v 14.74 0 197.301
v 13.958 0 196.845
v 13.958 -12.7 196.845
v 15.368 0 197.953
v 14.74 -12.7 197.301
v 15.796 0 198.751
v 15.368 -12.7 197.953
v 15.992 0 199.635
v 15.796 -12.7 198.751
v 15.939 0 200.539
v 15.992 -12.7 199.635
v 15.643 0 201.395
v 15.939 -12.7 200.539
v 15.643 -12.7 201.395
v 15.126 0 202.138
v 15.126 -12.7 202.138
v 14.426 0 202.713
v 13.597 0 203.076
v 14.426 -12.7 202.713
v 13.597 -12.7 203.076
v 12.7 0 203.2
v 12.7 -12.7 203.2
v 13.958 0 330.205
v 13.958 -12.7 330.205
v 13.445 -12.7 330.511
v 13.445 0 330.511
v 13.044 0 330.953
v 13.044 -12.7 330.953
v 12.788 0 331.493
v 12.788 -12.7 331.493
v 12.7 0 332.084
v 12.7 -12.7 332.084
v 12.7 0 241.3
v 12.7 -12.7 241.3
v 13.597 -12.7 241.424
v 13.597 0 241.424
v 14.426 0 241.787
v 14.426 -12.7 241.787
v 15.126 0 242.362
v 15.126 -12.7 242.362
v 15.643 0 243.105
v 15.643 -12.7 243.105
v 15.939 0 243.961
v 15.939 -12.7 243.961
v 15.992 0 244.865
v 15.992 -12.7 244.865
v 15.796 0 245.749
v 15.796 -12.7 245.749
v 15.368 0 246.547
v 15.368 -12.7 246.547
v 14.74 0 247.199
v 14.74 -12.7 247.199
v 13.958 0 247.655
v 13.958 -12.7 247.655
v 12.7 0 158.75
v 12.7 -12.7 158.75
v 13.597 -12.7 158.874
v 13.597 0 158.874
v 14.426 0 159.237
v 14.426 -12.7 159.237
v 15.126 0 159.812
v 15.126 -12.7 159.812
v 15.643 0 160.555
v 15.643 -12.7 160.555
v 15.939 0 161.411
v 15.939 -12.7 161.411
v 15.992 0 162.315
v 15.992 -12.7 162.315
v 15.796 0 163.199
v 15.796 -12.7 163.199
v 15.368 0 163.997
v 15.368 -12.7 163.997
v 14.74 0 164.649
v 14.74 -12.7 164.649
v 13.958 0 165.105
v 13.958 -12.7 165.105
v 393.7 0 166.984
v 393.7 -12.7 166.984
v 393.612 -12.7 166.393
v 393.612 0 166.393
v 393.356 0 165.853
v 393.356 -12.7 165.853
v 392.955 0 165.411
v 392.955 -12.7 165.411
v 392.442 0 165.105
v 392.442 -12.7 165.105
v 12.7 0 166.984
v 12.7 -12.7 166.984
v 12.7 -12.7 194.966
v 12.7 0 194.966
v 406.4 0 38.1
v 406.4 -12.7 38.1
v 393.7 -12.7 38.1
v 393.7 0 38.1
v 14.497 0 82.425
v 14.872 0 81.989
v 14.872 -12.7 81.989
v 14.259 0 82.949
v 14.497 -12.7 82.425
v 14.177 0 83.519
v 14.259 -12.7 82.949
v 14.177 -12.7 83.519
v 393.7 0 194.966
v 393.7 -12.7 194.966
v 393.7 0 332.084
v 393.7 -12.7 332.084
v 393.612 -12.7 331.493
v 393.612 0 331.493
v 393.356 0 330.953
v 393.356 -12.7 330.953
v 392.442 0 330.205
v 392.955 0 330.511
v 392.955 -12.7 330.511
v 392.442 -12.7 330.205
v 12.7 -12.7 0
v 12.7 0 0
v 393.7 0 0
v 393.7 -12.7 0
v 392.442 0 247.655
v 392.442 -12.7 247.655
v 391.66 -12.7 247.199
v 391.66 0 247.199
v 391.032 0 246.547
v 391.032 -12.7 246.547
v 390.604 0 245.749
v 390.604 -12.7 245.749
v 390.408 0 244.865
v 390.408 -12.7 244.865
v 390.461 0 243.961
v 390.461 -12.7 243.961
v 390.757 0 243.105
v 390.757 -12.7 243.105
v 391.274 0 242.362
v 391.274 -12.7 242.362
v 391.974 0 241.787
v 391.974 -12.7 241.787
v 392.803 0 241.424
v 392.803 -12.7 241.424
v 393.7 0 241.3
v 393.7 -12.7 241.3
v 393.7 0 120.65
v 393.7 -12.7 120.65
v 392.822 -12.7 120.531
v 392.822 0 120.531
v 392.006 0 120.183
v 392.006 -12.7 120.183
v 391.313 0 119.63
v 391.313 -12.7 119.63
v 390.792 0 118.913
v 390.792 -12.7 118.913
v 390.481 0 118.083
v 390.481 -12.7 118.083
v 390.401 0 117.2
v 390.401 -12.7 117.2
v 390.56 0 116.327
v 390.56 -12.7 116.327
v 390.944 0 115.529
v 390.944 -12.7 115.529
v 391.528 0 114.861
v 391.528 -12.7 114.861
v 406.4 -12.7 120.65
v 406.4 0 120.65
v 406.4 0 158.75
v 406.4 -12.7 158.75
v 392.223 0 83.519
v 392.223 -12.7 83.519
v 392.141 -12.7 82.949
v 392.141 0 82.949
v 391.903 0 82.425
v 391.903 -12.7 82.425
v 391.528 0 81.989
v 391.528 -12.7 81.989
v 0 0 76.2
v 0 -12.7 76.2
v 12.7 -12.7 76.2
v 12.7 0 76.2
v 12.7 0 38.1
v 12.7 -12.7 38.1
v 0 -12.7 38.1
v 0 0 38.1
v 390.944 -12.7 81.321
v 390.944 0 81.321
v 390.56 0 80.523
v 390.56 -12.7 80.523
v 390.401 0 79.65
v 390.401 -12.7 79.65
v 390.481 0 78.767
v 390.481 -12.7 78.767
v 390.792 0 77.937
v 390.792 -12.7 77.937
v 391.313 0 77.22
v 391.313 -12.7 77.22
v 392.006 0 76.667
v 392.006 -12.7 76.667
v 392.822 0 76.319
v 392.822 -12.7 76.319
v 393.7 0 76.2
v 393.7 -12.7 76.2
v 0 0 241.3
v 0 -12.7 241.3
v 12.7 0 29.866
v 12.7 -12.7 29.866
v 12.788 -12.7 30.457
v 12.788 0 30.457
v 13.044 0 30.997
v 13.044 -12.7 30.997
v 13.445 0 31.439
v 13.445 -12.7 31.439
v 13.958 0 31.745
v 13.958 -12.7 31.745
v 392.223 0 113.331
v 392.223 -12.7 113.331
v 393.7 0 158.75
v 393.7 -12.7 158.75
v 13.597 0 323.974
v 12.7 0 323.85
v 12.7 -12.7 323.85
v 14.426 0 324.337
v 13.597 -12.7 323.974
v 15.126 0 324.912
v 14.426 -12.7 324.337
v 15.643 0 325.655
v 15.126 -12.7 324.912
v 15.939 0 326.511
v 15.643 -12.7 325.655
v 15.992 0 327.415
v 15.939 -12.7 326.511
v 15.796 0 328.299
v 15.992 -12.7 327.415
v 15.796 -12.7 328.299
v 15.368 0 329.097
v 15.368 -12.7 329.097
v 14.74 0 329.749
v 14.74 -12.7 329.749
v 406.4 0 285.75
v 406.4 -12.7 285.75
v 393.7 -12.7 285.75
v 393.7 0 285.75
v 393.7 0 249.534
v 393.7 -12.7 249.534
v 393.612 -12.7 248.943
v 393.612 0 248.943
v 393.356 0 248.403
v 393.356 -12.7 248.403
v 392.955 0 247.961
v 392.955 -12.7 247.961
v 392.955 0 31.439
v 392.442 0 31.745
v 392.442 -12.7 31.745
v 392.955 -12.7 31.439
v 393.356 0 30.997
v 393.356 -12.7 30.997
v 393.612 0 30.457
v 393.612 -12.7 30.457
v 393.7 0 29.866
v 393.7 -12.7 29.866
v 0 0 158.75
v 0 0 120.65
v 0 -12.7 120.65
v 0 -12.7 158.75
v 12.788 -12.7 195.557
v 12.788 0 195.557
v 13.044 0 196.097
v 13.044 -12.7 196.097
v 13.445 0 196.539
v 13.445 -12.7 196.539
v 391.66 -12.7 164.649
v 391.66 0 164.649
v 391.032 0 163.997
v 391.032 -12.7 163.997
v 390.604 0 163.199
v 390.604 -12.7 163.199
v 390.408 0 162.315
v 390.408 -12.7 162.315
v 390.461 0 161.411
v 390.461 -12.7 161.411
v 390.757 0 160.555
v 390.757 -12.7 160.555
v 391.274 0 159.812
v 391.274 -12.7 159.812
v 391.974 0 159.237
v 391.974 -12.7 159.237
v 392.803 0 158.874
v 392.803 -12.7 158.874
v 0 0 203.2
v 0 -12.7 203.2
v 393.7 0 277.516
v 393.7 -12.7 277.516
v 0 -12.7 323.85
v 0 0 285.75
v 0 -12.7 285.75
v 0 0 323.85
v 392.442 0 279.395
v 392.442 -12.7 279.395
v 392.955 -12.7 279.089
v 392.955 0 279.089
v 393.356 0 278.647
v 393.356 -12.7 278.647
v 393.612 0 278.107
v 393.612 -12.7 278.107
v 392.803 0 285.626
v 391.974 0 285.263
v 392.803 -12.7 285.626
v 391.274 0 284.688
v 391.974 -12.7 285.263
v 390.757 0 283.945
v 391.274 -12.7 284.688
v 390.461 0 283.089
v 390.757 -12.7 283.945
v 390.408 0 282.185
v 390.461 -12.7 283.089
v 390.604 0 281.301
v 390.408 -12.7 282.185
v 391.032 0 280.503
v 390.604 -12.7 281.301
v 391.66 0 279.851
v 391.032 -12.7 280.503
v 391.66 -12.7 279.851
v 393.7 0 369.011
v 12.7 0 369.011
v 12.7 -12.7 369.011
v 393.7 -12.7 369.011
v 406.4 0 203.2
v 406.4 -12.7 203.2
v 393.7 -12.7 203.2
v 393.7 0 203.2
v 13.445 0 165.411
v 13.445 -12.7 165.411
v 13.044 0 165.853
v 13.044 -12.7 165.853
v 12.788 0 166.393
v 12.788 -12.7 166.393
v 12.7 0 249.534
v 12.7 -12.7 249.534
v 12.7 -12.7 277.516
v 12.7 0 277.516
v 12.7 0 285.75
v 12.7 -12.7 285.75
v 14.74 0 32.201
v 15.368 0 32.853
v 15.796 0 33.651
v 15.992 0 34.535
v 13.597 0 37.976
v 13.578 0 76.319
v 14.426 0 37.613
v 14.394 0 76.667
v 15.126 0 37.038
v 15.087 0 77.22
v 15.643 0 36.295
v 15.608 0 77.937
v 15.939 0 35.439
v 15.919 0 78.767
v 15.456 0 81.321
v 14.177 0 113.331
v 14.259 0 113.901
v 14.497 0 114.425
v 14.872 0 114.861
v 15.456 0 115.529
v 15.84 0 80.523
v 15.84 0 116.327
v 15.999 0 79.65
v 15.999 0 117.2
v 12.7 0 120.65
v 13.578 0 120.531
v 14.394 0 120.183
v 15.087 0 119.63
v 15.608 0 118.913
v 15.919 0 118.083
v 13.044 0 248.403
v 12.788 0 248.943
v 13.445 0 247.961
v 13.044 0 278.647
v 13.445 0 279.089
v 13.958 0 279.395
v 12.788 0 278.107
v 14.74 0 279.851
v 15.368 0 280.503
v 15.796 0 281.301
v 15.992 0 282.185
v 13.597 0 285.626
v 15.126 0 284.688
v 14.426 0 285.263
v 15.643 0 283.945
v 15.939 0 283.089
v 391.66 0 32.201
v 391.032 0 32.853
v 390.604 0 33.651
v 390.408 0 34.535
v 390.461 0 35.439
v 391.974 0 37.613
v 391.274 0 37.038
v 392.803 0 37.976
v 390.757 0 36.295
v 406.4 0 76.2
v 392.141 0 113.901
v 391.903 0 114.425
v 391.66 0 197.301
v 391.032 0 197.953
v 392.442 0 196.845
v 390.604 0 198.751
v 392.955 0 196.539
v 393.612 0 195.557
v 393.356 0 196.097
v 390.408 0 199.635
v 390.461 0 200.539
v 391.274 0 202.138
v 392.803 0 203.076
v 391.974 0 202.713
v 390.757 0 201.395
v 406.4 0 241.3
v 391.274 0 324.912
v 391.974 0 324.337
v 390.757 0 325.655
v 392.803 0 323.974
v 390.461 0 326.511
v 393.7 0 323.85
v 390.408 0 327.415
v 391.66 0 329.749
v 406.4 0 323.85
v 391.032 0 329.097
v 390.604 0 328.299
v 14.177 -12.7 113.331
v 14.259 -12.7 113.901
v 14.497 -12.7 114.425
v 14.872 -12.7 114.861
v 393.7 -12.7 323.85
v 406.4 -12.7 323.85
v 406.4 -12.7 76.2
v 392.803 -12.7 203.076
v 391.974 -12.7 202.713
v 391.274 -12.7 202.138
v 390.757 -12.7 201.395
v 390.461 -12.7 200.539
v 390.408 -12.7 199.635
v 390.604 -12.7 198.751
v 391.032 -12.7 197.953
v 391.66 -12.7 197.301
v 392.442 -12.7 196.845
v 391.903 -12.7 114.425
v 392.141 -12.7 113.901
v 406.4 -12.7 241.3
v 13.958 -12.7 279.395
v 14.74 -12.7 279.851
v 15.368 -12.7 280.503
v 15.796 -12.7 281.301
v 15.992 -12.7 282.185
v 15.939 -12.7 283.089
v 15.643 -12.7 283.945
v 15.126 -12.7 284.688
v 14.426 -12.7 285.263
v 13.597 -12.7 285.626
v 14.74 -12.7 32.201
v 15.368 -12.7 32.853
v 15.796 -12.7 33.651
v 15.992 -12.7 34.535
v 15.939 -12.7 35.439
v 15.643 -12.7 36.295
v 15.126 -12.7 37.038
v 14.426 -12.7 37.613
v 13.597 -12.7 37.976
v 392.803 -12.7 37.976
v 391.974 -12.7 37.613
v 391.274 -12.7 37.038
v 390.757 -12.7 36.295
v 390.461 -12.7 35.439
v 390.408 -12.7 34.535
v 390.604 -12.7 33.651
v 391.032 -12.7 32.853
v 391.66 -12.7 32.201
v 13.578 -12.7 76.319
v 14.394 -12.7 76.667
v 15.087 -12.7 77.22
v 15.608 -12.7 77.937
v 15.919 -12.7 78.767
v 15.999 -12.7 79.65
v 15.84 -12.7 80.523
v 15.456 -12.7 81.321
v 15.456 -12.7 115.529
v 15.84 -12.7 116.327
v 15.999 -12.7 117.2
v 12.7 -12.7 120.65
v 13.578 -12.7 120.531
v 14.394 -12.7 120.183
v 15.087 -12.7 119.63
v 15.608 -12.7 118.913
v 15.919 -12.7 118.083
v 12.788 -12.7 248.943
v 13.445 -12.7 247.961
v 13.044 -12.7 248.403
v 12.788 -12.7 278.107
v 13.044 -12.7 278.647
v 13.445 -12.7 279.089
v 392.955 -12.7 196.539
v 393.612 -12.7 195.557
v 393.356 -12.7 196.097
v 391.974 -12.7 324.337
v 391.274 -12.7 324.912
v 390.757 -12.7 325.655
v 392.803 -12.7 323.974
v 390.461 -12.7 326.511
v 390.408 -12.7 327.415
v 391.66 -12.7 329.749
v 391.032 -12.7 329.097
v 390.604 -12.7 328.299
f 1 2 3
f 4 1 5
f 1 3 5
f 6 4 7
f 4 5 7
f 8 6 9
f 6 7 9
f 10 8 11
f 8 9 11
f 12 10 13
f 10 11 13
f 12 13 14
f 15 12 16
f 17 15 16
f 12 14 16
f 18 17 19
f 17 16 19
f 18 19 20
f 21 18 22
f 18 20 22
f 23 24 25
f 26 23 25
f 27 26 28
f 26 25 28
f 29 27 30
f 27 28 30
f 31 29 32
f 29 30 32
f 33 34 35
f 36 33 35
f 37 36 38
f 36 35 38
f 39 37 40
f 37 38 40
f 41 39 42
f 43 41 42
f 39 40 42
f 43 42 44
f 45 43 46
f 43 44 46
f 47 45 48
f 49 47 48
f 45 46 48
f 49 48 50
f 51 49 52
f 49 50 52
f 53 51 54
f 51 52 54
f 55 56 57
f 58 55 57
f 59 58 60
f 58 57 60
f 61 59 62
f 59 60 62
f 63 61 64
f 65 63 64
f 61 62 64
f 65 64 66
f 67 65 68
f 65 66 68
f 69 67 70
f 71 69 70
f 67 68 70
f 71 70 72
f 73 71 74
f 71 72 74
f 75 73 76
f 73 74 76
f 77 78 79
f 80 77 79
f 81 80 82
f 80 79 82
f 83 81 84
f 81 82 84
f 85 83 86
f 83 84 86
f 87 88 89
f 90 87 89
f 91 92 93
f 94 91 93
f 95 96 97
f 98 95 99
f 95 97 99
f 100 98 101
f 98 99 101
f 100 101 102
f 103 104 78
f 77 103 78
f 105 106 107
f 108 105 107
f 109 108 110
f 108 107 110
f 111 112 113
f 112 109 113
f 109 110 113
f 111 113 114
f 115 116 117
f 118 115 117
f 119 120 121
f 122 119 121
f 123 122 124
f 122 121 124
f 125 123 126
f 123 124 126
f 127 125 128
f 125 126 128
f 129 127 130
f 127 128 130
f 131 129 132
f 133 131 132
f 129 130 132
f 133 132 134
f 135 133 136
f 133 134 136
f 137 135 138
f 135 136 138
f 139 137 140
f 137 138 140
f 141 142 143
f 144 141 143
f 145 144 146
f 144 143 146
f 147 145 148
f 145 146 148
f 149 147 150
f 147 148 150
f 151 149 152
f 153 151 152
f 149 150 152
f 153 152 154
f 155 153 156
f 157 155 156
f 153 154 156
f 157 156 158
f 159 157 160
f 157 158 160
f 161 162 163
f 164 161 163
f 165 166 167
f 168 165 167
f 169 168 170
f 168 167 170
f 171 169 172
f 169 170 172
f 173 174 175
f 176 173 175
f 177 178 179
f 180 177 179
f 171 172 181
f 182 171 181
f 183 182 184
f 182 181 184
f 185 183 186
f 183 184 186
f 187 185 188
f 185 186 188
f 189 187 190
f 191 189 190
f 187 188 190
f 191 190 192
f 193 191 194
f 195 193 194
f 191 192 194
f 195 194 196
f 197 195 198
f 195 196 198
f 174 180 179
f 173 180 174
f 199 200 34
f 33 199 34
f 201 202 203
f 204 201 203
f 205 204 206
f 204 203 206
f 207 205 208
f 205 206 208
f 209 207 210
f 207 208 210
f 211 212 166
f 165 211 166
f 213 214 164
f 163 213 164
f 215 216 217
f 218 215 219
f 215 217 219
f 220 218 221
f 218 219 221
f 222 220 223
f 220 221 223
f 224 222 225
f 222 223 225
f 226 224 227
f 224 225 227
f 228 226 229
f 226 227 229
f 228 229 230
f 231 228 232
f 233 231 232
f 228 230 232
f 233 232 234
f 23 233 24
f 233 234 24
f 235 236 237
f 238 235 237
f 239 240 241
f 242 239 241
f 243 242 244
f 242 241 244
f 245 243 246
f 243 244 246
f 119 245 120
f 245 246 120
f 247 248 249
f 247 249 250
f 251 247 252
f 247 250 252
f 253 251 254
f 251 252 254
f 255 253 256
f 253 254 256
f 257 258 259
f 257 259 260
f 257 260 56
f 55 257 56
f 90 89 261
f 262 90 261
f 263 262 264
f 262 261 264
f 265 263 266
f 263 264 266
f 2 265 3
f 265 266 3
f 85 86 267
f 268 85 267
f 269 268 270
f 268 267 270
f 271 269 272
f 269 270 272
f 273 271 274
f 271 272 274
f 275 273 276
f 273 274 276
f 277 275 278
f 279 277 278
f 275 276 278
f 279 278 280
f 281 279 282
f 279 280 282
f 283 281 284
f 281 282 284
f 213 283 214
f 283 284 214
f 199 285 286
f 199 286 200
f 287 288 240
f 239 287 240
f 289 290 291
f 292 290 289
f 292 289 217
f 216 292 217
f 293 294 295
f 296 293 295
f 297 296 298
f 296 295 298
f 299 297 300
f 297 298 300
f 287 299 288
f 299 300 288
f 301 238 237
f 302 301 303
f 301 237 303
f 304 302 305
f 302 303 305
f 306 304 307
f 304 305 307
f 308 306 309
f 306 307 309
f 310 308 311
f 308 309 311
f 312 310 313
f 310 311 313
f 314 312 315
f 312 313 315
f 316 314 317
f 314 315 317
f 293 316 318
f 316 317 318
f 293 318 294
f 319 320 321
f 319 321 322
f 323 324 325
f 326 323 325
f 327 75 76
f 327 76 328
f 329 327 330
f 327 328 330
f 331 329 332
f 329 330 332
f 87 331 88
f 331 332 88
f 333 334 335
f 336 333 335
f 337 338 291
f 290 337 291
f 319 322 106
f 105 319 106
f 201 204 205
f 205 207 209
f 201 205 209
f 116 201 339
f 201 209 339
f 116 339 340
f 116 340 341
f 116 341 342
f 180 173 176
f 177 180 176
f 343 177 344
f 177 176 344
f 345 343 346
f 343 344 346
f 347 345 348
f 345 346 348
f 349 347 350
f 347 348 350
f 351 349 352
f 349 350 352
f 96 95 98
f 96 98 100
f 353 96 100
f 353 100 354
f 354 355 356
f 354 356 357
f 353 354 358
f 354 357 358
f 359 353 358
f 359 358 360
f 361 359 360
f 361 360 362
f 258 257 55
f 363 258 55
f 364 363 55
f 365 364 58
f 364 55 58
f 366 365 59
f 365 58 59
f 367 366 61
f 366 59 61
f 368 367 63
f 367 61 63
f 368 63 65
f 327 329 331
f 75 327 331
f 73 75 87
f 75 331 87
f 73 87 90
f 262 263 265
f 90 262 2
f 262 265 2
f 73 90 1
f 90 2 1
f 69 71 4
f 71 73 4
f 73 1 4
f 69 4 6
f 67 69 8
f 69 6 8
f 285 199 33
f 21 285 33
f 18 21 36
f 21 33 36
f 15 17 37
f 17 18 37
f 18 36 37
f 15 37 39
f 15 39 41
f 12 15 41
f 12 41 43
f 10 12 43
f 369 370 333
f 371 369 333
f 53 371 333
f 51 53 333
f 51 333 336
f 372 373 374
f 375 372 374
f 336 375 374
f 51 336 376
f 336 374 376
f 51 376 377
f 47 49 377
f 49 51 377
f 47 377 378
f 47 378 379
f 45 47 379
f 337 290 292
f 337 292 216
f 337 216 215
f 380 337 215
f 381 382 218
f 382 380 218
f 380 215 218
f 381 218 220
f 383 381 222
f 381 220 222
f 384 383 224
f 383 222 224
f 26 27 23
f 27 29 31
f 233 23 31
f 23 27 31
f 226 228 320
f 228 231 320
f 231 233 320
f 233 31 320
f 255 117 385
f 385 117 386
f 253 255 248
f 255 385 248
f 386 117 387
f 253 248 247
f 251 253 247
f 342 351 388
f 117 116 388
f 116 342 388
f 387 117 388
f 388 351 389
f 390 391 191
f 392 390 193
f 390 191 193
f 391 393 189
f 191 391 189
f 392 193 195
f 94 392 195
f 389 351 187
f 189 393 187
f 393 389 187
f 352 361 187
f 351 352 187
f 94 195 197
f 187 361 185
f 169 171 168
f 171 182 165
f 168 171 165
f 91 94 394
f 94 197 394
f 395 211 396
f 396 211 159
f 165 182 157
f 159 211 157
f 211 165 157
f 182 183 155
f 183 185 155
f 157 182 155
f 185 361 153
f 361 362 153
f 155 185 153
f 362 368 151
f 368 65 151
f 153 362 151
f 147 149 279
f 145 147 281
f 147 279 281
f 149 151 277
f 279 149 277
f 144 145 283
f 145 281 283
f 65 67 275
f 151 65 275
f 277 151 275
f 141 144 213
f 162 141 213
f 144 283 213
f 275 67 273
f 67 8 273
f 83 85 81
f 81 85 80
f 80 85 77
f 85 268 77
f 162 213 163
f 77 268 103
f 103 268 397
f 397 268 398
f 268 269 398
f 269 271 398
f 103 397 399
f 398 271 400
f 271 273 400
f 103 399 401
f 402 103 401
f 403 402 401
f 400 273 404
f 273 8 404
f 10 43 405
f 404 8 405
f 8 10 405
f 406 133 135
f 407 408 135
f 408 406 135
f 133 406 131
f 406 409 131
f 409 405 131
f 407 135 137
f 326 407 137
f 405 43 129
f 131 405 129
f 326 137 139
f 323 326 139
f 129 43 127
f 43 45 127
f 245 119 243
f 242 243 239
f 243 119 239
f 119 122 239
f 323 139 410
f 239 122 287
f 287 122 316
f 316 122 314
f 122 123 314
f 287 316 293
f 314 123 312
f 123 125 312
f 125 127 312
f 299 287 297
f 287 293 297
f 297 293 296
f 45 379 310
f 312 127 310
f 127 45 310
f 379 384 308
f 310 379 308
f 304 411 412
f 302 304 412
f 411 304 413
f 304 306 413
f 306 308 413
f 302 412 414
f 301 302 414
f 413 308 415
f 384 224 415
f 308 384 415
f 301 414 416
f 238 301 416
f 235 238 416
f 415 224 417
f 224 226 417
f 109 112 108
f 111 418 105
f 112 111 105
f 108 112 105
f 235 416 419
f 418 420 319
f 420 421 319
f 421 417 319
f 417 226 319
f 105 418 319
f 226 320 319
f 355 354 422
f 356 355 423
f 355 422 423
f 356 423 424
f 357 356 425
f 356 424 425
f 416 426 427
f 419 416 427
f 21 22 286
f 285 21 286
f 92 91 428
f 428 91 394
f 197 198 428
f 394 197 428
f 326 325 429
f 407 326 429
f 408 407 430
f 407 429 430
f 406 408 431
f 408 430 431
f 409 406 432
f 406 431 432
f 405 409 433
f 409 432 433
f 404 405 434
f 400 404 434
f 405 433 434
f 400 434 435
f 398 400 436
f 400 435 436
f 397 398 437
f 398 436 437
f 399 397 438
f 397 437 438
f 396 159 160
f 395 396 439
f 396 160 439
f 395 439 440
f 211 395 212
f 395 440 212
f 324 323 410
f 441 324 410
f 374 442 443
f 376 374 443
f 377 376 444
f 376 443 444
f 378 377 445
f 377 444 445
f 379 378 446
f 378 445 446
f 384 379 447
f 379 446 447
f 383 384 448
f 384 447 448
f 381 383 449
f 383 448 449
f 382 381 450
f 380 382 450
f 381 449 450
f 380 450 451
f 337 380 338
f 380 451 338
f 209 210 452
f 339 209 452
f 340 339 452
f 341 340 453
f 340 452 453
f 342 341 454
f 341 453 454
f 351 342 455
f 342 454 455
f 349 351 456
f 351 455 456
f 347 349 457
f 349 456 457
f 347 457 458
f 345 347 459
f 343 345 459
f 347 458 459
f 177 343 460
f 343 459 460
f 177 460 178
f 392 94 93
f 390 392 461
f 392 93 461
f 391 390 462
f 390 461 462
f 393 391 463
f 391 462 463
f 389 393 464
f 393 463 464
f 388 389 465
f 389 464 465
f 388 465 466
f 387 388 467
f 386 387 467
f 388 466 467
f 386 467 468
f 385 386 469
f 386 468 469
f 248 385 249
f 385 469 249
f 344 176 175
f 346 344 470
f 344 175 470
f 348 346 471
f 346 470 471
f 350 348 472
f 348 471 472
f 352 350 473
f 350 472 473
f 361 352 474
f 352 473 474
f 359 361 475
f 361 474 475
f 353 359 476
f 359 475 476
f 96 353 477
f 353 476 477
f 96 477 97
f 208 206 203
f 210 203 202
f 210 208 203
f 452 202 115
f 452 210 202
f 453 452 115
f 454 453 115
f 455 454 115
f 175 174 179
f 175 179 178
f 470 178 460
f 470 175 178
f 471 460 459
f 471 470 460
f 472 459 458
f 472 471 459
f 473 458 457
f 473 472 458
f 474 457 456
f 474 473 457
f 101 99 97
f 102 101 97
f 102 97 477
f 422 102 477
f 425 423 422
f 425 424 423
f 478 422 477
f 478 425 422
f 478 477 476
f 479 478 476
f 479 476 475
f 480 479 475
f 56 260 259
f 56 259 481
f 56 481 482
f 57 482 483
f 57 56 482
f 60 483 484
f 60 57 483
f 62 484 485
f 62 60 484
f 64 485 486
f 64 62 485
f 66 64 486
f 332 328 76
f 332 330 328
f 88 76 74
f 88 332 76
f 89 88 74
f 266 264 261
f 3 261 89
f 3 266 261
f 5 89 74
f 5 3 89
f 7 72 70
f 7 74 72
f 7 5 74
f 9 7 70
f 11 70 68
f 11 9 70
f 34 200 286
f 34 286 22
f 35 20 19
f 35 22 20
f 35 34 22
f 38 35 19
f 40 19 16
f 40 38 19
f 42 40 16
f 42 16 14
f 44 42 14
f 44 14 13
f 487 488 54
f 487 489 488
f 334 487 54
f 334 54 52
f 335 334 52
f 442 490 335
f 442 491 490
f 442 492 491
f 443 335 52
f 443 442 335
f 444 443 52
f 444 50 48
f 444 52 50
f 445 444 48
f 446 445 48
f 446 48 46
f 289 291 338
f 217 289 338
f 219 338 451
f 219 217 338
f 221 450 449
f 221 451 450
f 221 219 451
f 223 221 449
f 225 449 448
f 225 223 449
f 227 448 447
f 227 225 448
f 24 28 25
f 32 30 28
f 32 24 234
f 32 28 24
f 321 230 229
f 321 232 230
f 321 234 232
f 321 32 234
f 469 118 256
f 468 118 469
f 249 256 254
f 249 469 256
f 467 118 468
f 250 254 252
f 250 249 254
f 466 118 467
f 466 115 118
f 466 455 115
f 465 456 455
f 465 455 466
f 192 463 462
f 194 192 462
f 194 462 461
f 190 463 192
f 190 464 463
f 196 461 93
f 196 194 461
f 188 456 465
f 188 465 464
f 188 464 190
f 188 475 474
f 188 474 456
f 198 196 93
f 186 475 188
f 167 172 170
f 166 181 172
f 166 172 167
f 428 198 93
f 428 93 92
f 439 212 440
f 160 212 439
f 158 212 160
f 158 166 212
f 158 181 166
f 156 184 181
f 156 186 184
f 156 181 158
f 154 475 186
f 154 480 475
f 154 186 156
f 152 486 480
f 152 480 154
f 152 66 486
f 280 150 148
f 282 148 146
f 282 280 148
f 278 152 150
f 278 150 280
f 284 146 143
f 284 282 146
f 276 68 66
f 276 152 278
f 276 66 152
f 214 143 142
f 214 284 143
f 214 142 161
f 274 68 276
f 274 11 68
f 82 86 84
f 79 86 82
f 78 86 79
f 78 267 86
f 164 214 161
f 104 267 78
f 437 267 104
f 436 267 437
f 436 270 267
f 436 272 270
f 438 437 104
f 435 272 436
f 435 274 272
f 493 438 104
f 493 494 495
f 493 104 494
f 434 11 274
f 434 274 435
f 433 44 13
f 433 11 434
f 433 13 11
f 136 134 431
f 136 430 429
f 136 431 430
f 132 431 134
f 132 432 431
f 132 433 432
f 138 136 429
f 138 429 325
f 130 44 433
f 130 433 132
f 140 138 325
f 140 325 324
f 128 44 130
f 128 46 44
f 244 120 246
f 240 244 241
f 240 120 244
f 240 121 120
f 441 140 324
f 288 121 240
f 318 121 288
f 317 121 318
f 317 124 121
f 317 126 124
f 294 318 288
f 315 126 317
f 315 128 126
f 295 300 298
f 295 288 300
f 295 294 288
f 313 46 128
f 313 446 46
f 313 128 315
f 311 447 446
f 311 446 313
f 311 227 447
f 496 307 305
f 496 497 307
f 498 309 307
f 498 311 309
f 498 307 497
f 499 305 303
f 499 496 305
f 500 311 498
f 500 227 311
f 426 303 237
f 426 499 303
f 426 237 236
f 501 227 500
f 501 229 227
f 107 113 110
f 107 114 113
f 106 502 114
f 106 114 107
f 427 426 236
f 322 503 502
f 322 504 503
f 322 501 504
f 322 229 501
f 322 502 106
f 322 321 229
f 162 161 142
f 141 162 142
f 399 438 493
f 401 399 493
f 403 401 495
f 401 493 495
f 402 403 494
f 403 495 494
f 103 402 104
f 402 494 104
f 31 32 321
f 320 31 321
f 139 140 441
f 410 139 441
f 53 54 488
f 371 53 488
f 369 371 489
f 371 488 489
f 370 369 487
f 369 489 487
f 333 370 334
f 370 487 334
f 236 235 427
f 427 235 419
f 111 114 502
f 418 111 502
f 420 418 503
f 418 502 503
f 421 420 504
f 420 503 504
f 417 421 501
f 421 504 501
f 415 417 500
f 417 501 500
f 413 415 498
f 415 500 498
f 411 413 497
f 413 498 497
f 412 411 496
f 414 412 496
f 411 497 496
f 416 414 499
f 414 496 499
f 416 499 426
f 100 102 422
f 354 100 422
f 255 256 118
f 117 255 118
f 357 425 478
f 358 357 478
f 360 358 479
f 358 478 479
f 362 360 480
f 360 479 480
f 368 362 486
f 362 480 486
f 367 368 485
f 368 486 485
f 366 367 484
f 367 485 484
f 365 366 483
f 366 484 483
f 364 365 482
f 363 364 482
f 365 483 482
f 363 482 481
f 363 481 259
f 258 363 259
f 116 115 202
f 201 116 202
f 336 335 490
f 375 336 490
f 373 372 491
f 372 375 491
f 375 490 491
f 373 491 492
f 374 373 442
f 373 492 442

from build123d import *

# Parameters (mm, degrees)
F0_W     = 406.4
F0_H     = 369.0112
F1_DEPTH = 12.7
F3_DEPTH = 25.4


with BuildPart() as f1:
    # F0 (on Front) → F1 (new body)
    with BuildSketch(Plane.XZ):
        with Locations((203.2, 184.5056)):
            Rectangle(F0_W, F0_H)
    extrude(amount=F1_DEPTH)

    # F2 (on face) → F3 (cut)
    with BuildSketch(Plane.XZ.offset(12.7)):
        with BuildLine():
            Line((0, 38.1), (0, 0))
            Line((0, 0), (12.7, 0))
            Line((12.7, 0), (12.7, 29.866212))
            ThreePointArc((12.7, 29.866212), (13.043512, 30.996713), (13.957905, 31.744988))
            ThreePointArc((13.957905, 31.744988), (15.939155, 35.439155), (12.7, 38.1))
            Line((12.7, 38.1), (0, 38.1))
        make_face()
        with BuildLine():
            Line((0, 120.65), (0, 76.2))
            Line((0, 76.2), (12.7, 76.2))
            ThreePointArc((12.7, 76.2), (15.791481, 78.341851), (14.872368, 81.988769))
            ThreePointArc((14.872368, 81.988769), (14.359145, 82.678683), (14.177211, 83.519088))
            Line((14.177211, 83.519088), (14.177211, 113.330912))
            ThreePointArc((14.177211, 113.330912), (14.359145, 114.171317), (14.872368, 114.861231))
            ThreePointArc((14.872368, 114.861231), (15.791481, 118.508149), (12.7, 120.65))
            Line((12.7, 120.65), (0, 120.65))
        make_face()
        with BuildLine():
            Line((12.7, 203.2), (0, 203.2))
            Line((0, 203.2), (0, 158.75))
            Line((0, 158.75), (12.7, 158.75))
            ThreePointArc((12.7, 158.75), (15.939155, 161.410845), (13.957905, 165.105012))
            ThreePointArc((13.957905, 165.105012), (13.043512, 165.853287), (12.7, 166.983788))
            Line((12.7, 166.983788), (12.7, 194.966212))
            ThreePointArc((12.7, 194.966212), (13.043512, 196.096713), (13.957905, 196.844988))
            ThreePointArc((13.957905, 196.844988), (15.939155, 200.539155), (12.7, 203.2))
        make_face()
        with BuildLine():
            Line((12.7, 285.75), (0, 285.75))
            Line((0, 285.75), (0, 241.3))
            Line((0, 241.3), (12.7, 241.3))
            ThreePointArc((12.7, 241.3), (15.939155, 243.960845), (13.957905, 247.655012))
            ThreePointArc((13.957905, 247.655012), (13.043512, 248.403287), (12.7, 249.533788))
            Line((12.7, 249.533788), (12.7, 277.516212))
            ThreePointArc((12.7, 277.516212), (13.043512, 278.646713), (13.957905, 279.394988))
            ThreePointArc((13.957905, 279.394988), (15.939155, 283.089155), (12.7, 285.75))
        make_face()
        with BuildLine():
            Line((0, 369.0112), (0, 323.85))
            Line((0, 323.85), (12.7, 323.85))
            ThreePointArc((12.7, 323.85), (15.939155, 326.510845), (13.957905, 330.205012))
            ThreePointArc((13.957905, 330.205012), (13.043512, 330.953287), (12.7, 332.083788))
            Line((12.7, 332.083788), (12.7, 369.0112))
            Line((12.7, 369.0112), (0, 369.0112))
        make_face()
        with BuildLine():
            Line((393.7, 277.516212), (393.7, 249.533788))
            ThreePointArc((393.7, 249.533788), (393.356488, 248.403287), (392.442095, 247.655012))
            ThreePointArc((392.442095, 247.655012), (390.460845, 243.960845), (393.7, 241.3))
            Line((393.7, 241.3), (406.4, 241.3))
            Line((406.4, 241.3), (406.4, 285.75))
            Line((406.4, 285.75), (393.7, 285.75))
            ThreePointArc((393.7, 285.75), (390.460845, 283.089155), (392.442095, 279.394988))
            ThreePointArc((392.442095, 279.394988), (393.356488, 278.646713), (393.7, 277.516212))
        make_face()
        with BuildLine():
            Line((393.7, 194.966212), (393.7, 166.983788))
            ThreePointArc((393.7, 166.983788), (393.356488, 165.853287), (392.442095, 165.105012))
            ThreePointArc((392.442095, 165.105012), (390.460845, 161.410845), (393.7, 158.75))
            Line((393.7, 158.75), (406.4, 158.75))
            Line((406.4, 158.75), (406.4, 203.2))
            Line((406.4, 203.2), (393.7, 203.2))
            ThreePointArc((393.7, 203.2), (390.460845, 200.539155), (392.442095, 196.844988))
            ThreePointArc((392.442095, 196.844988), (393.356488, 196.096713), (393.7, 194.966212))
        make_face()
        with BuildLine():
            ThreePointArc((393.7, 38.1), (390.460845, 35.439155), (392.442095, 31.744988))
            ThreePointArc((392.442095, 31.744988), (393.356488, 30.996713), (393.7, 29.866212))
            Line((393.7, 29.866212), (393.7, 0))
            Line((393.7, 0), (406.4, 0))
            Line((406.4, 0), (406.4, 38.1))
            Line((406.4, 38.1), (393.7, 38.1))
        make_face()
        with BuildLine():
            ThreePointArc((391.527632, 81.988769), (390.608519, 78.341851), (393.7, 76.2))
            Line((393.7, 76.2), (406.4, 76.2))
            Line((406.4, 76.2), (406.4, 120.65))
            Line((406.4, 120.65), (393.7, 120.65))
            ThreePointArc((393.7, 120.65), (390.608519, 118.508149), (391.527632, 114.861231))
            ThreePointArc((391.527632, 114.861231), (392.040855, 114.171317), (392.222789, 113.330912))
            Line((392.222789, 113.330912), (392.222789, 83.519088))
            ThreePointArc((392.222789, 83.519088), (392.040855, 82.678683), (391.527632, 81.988769))
        make_face()
        with BuildLine():
            ThreePointArc((392.442095, 330.205012), (390.460845, 326.510845), (393.7, 323.85))
            Line((393.7, 323.85), (406.4, 323.85))
            Line((406.4, 323.85), (406.4, 369.0112))
            Line((406.4, 369.0112), (393.7, 369.0112))
            Line((393.7, 369.0112), (393.7, 332.083788))
            ThreePointArc((393.7, 332.083788), (393.356488, 330.953287), (392.442095, 330.205012))
        make_face()
    extrude(amount=-F3_DEPTH, mode=Mode.SUBTRACT)


solid = f1.part
